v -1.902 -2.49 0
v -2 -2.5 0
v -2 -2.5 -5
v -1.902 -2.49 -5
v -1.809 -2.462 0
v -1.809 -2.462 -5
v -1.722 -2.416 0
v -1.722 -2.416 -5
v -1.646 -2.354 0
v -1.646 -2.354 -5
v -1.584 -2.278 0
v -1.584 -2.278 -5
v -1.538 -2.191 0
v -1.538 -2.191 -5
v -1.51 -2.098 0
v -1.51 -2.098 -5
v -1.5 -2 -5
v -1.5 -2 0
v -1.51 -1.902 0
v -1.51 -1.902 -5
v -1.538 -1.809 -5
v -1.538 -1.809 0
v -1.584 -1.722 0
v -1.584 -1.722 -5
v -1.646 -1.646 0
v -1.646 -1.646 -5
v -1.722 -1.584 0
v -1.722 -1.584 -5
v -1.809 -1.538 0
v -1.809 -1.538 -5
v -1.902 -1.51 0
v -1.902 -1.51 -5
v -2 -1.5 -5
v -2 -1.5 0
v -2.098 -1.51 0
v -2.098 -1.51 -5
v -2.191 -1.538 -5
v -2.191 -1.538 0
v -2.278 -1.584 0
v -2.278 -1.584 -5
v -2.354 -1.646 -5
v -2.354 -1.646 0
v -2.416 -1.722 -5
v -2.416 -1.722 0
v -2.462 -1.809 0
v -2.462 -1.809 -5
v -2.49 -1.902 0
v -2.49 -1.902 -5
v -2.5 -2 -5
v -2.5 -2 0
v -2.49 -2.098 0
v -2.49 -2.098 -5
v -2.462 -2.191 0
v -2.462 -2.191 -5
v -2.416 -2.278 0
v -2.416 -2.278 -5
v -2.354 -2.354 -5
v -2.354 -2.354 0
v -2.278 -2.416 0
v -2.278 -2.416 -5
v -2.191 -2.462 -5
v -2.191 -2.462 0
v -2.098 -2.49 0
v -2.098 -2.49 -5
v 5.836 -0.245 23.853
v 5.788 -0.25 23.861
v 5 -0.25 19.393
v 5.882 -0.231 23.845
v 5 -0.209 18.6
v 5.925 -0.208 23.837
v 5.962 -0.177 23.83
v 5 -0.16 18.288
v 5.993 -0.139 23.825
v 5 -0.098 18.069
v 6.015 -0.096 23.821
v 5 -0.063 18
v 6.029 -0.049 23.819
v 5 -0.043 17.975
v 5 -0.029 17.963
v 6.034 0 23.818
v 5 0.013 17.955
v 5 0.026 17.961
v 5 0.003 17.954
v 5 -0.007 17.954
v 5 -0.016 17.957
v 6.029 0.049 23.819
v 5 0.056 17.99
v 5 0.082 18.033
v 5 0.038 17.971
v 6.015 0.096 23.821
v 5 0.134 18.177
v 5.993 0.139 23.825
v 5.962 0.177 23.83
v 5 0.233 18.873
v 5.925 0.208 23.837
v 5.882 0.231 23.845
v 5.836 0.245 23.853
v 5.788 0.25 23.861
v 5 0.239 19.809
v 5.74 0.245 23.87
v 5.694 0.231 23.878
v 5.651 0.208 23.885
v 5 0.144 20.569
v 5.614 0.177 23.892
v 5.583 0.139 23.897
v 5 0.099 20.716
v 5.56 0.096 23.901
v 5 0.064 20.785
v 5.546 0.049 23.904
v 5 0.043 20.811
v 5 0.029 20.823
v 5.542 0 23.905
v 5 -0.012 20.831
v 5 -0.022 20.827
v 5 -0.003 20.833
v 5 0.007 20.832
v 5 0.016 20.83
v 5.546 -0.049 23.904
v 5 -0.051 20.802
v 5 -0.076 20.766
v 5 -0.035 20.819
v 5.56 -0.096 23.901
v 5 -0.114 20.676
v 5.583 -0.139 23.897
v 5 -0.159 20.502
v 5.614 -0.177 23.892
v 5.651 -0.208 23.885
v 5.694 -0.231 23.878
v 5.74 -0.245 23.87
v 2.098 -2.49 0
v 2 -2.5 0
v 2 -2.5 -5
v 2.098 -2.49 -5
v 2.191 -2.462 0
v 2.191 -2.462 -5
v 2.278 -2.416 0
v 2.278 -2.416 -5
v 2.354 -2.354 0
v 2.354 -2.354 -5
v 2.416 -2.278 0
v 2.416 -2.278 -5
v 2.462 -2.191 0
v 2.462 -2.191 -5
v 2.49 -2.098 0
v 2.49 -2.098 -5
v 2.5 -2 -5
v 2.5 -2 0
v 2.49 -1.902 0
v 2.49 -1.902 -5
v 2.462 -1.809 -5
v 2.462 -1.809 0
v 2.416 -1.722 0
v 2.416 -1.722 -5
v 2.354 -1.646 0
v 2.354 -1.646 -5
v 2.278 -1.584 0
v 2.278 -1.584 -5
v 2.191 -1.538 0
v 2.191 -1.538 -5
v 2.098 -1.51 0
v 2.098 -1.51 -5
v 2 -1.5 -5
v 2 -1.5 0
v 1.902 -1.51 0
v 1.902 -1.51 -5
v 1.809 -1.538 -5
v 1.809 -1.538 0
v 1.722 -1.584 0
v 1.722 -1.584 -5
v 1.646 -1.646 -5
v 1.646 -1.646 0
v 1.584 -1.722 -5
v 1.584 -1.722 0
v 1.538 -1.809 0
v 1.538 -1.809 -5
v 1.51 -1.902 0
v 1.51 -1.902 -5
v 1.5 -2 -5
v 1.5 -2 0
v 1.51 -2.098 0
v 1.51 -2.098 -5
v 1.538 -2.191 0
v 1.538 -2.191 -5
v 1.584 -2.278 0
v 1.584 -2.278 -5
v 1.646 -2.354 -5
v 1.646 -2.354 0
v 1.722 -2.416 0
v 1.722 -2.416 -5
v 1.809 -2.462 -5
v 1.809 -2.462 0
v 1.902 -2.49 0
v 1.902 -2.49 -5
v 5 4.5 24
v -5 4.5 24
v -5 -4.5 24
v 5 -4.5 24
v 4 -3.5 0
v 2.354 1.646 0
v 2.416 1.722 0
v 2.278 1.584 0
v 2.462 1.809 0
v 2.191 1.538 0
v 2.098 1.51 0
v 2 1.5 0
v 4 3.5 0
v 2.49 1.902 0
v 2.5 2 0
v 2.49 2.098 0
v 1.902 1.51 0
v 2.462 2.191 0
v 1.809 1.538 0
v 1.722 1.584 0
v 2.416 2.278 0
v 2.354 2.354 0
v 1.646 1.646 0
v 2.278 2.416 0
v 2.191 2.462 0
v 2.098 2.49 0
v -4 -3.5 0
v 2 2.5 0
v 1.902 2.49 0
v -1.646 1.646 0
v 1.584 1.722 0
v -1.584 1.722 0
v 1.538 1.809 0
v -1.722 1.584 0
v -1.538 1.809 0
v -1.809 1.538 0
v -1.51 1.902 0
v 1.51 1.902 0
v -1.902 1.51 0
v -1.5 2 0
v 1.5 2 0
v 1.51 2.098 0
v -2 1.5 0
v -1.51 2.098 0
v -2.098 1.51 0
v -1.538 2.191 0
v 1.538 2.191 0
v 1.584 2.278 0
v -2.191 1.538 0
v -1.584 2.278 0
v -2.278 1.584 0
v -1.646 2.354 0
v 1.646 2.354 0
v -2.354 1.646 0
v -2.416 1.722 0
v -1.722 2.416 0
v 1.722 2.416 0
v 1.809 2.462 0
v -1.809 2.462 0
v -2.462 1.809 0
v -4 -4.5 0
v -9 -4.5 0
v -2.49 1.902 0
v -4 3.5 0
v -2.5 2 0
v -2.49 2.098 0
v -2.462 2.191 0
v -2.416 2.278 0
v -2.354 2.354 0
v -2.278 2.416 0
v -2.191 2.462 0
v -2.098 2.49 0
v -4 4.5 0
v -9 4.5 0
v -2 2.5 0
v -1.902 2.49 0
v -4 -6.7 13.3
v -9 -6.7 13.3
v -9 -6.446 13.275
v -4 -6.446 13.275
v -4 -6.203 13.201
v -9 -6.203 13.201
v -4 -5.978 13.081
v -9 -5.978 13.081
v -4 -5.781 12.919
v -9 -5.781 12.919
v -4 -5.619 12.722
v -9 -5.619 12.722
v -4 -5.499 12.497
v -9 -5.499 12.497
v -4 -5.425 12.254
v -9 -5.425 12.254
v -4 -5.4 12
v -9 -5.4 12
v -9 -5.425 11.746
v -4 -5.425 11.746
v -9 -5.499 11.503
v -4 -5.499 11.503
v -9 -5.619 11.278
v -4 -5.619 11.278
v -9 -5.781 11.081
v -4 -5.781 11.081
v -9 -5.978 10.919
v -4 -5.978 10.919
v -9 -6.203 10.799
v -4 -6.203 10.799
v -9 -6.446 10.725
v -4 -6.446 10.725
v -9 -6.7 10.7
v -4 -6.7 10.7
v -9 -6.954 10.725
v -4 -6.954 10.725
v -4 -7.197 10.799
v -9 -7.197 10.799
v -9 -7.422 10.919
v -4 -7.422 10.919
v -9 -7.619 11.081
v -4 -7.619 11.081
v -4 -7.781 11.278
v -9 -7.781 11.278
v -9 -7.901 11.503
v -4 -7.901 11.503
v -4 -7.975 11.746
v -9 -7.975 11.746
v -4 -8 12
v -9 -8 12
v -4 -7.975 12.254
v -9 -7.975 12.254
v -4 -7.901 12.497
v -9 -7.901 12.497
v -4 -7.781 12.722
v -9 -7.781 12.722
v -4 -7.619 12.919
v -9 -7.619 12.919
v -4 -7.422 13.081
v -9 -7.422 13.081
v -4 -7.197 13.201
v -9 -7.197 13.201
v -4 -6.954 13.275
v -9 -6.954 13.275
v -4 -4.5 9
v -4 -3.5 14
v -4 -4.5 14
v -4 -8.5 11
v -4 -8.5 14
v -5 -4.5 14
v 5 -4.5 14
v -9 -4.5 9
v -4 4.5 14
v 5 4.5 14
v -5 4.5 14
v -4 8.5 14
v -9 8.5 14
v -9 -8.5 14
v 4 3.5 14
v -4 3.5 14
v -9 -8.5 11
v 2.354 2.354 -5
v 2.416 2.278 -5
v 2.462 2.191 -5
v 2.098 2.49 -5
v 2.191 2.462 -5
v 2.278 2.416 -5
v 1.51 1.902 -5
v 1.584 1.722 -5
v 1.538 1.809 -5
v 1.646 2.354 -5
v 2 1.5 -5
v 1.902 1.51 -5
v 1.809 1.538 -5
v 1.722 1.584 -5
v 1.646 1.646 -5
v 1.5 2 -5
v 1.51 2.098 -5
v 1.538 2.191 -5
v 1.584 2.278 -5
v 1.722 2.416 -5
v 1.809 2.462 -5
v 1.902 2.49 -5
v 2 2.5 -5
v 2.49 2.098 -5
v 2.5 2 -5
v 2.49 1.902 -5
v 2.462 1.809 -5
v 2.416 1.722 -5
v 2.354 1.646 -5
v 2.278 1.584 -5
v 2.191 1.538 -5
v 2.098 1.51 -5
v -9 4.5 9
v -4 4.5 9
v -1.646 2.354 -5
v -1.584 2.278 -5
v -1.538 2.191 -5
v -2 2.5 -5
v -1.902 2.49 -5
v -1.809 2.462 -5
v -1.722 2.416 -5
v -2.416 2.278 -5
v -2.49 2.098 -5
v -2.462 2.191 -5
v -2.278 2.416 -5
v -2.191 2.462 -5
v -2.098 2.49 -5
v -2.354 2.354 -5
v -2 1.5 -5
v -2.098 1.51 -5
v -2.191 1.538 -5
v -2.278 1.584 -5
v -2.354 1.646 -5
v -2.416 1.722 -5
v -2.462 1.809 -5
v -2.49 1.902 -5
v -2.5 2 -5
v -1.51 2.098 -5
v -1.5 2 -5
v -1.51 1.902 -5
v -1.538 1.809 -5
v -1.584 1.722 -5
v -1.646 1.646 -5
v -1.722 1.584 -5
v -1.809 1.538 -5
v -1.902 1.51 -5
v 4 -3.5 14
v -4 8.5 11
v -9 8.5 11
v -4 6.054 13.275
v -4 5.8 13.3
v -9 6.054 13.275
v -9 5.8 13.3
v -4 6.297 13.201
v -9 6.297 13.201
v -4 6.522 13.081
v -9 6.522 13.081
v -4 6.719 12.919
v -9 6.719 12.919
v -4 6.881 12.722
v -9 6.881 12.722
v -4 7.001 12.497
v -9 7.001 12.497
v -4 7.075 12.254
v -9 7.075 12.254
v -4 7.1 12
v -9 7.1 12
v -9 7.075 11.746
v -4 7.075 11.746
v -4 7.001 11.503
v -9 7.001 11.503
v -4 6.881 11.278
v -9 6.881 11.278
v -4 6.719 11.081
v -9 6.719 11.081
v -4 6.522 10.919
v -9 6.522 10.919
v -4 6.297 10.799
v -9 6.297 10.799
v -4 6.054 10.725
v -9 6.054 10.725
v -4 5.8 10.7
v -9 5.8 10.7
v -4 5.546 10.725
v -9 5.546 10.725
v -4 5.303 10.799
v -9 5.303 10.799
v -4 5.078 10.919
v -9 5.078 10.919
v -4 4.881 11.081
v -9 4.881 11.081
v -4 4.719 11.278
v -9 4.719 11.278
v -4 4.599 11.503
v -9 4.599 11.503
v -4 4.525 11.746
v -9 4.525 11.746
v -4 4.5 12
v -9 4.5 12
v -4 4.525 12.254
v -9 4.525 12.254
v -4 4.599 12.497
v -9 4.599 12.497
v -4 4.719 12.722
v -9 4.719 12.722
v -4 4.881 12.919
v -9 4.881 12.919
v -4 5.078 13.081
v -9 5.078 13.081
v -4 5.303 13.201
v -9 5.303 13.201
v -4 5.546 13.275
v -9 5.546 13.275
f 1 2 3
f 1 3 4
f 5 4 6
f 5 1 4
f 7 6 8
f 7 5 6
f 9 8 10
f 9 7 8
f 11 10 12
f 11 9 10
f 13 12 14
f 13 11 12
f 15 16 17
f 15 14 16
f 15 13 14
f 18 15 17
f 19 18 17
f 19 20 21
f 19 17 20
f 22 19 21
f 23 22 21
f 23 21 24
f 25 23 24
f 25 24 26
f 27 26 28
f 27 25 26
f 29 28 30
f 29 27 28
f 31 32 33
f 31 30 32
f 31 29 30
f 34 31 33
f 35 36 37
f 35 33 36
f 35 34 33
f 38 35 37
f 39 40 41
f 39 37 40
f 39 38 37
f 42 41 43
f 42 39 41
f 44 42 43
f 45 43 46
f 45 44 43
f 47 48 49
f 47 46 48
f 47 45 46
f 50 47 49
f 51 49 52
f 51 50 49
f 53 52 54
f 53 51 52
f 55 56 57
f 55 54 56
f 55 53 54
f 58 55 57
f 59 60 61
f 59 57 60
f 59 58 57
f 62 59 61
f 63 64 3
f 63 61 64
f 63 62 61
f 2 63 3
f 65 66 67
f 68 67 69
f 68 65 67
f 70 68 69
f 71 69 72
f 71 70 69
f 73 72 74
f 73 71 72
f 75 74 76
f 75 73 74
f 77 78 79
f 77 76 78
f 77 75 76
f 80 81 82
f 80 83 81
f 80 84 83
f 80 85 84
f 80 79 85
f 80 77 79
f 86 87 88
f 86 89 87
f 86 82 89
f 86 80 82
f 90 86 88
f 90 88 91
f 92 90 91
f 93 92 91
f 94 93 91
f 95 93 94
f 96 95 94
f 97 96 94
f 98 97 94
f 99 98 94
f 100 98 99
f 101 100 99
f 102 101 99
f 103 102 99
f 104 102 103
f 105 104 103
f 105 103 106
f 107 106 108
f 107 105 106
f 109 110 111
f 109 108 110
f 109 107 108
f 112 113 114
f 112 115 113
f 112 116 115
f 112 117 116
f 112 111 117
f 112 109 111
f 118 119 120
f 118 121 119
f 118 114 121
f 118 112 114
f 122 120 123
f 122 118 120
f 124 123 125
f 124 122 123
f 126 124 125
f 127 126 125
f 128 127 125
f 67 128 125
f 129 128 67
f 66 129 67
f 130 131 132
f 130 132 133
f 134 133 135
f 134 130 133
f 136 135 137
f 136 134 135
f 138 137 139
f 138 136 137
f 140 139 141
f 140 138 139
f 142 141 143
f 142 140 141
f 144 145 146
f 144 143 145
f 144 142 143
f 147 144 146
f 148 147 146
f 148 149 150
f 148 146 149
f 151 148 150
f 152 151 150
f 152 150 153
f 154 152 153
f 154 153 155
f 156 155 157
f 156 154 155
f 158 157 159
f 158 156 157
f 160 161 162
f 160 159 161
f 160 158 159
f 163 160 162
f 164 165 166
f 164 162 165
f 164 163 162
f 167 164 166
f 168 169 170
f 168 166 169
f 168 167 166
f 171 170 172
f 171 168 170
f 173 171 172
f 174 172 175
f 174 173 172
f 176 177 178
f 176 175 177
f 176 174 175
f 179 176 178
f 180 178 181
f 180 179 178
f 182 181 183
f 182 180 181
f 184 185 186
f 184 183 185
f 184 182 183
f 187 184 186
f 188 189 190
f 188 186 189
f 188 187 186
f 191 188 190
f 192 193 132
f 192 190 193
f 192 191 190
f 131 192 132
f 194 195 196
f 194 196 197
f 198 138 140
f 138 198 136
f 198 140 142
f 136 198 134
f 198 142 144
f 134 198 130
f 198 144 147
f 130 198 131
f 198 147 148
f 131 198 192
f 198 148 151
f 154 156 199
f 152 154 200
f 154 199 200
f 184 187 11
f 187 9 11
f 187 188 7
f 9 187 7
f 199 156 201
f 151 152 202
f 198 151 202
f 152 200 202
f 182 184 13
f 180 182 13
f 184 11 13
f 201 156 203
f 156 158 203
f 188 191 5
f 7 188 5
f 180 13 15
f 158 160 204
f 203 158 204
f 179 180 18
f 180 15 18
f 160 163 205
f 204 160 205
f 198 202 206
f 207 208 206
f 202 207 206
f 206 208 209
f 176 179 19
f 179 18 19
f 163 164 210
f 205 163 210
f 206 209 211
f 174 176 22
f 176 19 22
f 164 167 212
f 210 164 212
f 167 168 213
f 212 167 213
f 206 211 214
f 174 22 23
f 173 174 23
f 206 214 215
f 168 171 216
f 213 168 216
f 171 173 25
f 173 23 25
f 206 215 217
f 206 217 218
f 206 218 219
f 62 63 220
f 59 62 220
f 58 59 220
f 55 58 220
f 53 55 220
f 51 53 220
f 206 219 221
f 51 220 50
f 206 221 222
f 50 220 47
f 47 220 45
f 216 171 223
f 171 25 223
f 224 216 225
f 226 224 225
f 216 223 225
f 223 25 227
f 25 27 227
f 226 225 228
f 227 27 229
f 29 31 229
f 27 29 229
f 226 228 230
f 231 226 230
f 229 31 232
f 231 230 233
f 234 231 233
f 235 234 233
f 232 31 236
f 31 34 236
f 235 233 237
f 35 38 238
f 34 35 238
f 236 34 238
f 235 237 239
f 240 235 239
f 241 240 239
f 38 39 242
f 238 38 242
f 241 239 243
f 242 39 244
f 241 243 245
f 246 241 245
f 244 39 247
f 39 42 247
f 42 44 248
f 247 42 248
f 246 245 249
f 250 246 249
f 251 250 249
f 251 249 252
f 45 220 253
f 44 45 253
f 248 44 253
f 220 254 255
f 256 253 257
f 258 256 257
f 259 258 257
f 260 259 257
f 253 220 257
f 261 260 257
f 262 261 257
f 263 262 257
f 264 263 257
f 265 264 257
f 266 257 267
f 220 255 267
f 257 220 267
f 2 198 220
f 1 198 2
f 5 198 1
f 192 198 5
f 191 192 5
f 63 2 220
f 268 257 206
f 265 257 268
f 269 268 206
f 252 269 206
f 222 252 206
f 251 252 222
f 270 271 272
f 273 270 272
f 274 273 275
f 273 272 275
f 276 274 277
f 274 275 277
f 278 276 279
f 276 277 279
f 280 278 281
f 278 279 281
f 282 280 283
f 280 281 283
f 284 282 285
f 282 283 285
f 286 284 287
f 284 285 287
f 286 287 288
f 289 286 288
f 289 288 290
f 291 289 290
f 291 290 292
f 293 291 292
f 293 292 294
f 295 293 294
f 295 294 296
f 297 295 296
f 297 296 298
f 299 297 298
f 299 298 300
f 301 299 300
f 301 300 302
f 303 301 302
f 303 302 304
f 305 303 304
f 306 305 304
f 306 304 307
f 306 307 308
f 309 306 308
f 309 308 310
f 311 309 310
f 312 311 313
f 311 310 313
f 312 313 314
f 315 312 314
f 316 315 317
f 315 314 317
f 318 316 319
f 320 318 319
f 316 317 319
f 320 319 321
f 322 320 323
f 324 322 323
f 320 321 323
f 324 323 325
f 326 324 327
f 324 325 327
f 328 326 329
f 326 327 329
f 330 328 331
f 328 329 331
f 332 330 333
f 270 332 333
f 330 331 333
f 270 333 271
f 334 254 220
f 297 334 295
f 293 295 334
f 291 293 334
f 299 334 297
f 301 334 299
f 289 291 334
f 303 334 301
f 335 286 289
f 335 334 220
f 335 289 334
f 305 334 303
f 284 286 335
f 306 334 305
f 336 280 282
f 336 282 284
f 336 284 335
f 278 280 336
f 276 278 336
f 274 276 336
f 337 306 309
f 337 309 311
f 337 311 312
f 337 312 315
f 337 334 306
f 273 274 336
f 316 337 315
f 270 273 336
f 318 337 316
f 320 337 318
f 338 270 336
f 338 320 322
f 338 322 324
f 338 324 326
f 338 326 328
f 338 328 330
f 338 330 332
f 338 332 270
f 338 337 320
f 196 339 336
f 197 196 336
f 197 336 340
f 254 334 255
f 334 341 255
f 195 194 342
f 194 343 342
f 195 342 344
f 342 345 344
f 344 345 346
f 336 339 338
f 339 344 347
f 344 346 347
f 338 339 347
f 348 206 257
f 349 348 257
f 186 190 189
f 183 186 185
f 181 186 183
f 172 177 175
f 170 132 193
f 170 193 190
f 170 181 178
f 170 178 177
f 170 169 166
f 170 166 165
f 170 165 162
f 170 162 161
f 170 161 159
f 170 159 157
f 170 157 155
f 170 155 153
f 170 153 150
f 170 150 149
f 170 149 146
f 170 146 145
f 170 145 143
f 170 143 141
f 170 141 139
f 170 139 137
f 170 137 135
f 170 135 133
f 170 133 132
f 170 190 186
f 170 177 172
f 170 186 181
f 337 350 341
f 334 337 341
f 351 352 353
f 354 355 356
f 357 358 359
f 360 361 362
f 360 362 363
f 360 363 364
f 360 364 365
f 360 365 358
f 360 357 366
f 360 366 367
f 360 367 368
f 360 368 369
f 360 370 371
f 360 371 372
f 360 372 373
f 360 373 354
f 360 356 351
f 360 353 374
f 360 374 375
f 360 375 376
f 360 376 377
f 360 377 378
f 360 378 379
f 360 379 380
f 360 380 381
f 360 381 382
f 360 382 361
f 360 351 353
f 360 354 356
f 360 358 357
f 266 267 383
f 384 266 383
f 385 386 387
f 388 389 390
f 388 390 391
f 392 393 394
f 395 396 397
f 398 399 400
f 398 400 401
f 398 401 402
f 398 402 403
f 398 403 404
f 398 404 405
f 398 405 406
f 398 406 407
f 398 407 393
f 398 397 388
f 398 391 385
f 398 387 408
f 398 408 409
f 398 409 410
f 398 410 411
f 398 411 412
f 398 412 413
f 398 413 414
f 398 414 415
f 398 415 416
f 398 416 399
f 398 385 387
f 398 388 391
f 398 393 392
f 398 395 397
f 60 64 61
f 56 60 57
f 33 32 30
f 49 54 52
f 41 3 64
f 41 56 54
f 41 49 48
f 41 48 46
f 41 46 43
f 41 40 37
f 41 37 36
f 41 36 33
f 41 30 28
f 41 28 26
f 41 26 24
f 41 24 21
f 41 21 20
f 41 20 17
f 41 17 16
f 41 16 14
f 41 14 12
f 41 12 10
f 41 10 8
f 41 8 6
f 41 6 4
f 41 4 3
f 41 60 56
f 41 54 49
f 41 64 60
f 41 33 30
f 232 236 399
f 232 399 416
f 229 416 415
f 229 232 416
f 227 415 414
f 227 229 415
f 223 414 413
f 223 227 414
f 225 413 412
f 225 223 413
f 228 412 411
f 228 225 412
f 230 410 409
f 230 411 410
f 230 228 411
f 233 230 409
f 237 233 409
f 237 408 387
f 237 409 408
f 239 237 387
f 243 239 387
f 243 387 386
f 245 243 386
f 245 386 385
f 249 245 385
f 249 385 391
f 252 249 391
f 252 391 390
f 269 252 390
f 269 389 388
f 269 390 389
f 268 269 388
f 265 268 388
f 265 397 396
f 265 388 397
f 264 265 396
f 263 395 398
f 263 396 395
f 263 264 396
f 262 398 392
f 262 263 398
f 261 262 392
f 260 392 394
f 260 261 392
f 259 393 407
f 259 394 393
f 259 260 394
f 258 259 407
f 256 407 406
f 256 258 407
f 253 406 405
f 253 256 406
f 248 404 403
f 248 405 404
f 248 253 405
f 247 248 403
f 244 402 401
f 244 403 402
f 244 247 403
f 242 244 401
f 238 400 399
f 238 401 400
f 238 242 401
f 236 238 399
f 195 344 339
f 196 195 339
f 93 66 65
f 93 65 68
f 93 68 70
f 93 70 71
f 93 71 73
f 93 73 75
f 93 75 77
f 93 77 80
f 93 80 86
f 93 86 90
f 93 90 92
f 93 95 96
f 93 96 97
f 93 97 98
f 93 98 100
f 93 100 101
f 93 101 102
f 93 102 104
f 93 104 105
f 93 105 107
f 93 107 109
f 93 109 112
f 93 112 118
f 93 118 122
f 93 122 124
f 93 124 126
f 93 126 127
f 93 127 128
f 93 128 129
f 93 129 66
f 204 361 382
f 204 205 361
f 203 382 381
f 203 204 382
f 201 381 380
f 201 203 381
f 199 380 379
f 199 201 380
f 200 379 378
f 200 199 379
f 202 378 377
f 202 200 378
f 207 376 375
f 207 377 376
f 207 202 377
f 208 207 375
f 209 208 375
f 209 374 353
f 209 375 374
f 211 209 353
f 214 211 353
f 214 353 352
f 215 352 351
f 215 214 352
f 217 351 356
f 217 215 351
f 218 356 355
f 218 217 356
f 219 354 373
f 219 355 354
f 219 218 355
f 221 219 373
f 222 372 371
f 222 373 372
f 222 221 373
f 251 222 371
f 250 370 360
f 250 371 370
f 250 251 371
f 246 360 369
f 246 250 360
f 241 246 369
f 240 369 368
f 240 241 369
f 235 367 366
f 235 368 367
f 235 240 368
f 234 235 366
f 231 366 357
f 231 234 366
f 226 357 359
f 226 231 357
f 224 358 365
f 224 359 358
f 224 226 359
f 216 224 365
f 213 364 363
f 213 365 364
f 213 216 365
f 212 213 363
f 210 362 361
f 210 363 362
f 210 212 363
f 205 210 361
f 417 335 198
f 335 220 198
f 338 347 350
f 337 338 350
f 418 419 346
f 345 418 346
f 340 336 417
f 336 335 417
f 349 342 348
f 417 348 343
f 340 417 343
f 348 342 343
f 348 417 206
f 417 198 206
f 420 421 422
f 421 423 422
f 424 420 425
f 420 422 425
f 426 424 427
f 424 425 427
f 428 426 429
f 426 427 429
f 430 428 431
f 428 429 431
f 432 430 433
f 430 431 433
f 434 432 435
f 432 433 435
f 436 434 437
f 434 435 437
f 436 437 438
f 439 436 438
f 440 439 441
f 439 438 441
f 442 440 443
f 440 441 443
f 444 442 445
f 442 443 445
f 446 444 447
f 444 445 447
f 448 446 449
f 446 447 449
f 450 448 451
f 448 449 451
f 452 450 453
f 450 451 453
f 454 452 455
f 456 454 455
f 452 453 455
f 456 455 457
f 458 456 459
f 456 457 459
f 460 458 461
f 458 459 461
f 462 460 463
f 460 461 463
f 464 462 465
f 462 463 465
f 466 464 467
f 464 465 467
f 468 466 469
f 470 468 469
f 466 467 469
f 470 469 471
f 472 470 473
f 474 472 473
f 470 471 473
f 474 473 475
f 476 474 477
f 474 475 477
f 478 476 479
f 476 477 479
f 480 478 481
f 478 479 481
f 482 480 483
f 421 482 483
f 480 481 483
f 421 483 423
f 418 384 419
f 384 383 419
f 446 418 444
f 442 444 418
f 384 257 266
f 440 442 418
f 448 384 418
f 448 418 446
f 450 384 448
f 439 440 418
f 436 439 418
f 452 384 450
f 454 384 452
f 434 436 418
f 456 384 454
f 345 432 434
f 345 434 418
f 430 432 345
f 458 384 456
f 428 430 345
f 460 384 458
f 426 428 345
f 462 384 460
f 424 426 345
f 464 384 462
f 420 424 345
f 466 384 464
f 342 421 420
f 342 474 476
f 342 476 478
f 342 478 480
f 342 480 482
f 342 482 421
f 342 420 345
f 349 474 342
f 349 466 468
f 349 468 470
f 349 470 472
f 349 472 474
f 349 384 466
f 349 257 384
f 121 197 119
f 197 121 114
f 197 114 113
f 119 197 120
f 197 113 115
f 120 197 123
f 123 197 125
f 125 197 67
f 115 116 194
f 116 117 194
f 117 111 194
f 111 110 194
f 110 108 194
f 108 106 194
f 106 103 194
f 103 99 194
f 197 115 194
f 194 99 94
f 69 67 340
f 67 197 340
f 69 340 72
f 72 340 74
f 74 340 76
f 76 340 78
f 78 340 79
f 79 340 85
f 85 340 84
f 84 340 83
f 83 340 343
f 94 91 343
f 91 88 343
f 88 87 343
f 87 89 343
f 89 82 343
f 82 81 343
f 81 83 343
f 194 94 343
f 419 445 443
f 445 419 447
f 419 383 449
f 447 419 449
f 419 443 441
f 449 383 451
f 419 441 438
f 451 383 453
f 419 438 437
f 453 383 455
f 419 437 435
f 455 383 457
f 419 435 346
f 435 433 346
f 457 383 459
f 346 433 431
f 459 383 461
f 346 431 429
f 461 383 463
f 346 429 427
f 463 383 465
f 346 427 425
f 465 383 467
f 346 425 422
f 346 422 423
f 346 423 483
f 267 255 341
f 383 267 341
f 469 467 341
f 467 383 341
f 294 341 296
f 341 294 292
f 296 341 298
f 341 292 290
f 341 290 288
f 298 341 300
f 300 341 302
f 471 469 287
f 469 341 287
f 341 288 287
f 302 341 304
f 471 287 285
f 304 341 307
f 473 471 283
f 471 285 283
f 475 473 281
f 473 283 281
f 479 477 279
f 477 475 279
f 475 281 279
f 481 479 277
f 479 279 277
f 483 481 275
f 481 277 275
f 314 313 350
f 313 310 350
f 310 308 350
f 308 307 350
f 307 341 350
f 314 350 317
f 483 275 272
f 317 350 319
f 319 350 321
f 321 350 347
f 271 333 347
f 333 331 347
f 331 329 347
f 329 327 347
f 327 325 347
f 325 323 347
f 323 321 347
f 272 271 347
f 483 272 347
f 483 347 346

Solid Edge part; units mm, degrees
sketch "Sketch1" plane through (0, 0, 0) normal (0, 0, 1) x (1, 0, 0)
  line L0 (-4, -3.5) -> (4, -3.5)
  line L1 (4, -3.5) -> (4, 3.5)
  line L2 (4, 3.5) -> (-4, 3.5)
  line L3 (-4, 3.5) -> (-4, -3.5)
  dimension "D1" = 8
  dimension "D2" = 7
extrude "Protrusion1" add sketch "Sketch1" along normal blind 14
sketch "Sketch2" plane through (0, 0, 14) normal (0, 0, 1) x (1, 0, 0)
  line L0 (5, 4.5) -> (-5, 4.5)
  line L1 (-5, 4.5) -> (-5, -4.5)
  line L2 (-5, -4.5) -> (5, -4.5)
  line L3 (5, -4.5) -> (5, 4.5)
  dimension "D1" = 1
extrude "End" add sketch "Sketch2" along normal blind 10
sketch "Sketch3" plane through (-9, 0, 7) normal (-1, 0, 0) x (0, -1, 0)
  line L0 (-8.5, 7) -> (8.5, 7)
  line L1 (8.5, 7) -> (8.5, 4)
  line L2 (8.5, 4) -> (4.5, 2)
  line L3 (4.5, 2) -> (4.5, -7)
  line L4 (4.5, -7) -> (-4.5, -7)
  line L5 (-4.5, -7) -> (-4.5, 2)
  line L6 (-4.5, 2) -> (-8.5, 4)
  line L7 (-8.5, 4) -> (-8.5, 7)
  dimension "D1" = 4
  dimension "D2" = 3
  dimension "D3" = 9
extrude "Protrusion2" add sketch "Sketch3" against normal up to surface (5 mm away)
hole "Hole1" at (-9, 5.8, 12) direction (1, 0, 0) diameter 2.6 end up to next
hole "Hole2" at (-9, -6.7, 12) direction (1, 0, 0) diameter 2.6 end up to next
sketch "Sketch4" plane through (9.924, 0, 23.1318) normal (0.1736, 0, 0.9848) x (0, -1, 0)
  circle A0 centre (0, -4.2) radius 0.25
  dimension "D1" = 0.8
  dimension "D2" = 0.5
extrude "Protrusion3" add sketch "Sketch4" against normal up to next
sketch "Sketch5" plane through (-2.5, 0, 0) normal (0, 0, -1) x (0, -1, 0)
  circle A0 centre (-2, -0.5) radius 0.5
  circle A1 centre (2, -0.5) radius 0.5
  circle A2 centre (2, -4.5) radius 0.5
  circle A3 centre (-2, -4.5) radius 0.5
  dimension "D1" = 1
  dimension "D2" = 4
  dimension "D3" = 4
  dimension "D4" = 2
  dimension "D5" = 2
extrude "Wires" add sketch "Sketch5" along normal blind 5
properties material "Stainless Steel, 420"
